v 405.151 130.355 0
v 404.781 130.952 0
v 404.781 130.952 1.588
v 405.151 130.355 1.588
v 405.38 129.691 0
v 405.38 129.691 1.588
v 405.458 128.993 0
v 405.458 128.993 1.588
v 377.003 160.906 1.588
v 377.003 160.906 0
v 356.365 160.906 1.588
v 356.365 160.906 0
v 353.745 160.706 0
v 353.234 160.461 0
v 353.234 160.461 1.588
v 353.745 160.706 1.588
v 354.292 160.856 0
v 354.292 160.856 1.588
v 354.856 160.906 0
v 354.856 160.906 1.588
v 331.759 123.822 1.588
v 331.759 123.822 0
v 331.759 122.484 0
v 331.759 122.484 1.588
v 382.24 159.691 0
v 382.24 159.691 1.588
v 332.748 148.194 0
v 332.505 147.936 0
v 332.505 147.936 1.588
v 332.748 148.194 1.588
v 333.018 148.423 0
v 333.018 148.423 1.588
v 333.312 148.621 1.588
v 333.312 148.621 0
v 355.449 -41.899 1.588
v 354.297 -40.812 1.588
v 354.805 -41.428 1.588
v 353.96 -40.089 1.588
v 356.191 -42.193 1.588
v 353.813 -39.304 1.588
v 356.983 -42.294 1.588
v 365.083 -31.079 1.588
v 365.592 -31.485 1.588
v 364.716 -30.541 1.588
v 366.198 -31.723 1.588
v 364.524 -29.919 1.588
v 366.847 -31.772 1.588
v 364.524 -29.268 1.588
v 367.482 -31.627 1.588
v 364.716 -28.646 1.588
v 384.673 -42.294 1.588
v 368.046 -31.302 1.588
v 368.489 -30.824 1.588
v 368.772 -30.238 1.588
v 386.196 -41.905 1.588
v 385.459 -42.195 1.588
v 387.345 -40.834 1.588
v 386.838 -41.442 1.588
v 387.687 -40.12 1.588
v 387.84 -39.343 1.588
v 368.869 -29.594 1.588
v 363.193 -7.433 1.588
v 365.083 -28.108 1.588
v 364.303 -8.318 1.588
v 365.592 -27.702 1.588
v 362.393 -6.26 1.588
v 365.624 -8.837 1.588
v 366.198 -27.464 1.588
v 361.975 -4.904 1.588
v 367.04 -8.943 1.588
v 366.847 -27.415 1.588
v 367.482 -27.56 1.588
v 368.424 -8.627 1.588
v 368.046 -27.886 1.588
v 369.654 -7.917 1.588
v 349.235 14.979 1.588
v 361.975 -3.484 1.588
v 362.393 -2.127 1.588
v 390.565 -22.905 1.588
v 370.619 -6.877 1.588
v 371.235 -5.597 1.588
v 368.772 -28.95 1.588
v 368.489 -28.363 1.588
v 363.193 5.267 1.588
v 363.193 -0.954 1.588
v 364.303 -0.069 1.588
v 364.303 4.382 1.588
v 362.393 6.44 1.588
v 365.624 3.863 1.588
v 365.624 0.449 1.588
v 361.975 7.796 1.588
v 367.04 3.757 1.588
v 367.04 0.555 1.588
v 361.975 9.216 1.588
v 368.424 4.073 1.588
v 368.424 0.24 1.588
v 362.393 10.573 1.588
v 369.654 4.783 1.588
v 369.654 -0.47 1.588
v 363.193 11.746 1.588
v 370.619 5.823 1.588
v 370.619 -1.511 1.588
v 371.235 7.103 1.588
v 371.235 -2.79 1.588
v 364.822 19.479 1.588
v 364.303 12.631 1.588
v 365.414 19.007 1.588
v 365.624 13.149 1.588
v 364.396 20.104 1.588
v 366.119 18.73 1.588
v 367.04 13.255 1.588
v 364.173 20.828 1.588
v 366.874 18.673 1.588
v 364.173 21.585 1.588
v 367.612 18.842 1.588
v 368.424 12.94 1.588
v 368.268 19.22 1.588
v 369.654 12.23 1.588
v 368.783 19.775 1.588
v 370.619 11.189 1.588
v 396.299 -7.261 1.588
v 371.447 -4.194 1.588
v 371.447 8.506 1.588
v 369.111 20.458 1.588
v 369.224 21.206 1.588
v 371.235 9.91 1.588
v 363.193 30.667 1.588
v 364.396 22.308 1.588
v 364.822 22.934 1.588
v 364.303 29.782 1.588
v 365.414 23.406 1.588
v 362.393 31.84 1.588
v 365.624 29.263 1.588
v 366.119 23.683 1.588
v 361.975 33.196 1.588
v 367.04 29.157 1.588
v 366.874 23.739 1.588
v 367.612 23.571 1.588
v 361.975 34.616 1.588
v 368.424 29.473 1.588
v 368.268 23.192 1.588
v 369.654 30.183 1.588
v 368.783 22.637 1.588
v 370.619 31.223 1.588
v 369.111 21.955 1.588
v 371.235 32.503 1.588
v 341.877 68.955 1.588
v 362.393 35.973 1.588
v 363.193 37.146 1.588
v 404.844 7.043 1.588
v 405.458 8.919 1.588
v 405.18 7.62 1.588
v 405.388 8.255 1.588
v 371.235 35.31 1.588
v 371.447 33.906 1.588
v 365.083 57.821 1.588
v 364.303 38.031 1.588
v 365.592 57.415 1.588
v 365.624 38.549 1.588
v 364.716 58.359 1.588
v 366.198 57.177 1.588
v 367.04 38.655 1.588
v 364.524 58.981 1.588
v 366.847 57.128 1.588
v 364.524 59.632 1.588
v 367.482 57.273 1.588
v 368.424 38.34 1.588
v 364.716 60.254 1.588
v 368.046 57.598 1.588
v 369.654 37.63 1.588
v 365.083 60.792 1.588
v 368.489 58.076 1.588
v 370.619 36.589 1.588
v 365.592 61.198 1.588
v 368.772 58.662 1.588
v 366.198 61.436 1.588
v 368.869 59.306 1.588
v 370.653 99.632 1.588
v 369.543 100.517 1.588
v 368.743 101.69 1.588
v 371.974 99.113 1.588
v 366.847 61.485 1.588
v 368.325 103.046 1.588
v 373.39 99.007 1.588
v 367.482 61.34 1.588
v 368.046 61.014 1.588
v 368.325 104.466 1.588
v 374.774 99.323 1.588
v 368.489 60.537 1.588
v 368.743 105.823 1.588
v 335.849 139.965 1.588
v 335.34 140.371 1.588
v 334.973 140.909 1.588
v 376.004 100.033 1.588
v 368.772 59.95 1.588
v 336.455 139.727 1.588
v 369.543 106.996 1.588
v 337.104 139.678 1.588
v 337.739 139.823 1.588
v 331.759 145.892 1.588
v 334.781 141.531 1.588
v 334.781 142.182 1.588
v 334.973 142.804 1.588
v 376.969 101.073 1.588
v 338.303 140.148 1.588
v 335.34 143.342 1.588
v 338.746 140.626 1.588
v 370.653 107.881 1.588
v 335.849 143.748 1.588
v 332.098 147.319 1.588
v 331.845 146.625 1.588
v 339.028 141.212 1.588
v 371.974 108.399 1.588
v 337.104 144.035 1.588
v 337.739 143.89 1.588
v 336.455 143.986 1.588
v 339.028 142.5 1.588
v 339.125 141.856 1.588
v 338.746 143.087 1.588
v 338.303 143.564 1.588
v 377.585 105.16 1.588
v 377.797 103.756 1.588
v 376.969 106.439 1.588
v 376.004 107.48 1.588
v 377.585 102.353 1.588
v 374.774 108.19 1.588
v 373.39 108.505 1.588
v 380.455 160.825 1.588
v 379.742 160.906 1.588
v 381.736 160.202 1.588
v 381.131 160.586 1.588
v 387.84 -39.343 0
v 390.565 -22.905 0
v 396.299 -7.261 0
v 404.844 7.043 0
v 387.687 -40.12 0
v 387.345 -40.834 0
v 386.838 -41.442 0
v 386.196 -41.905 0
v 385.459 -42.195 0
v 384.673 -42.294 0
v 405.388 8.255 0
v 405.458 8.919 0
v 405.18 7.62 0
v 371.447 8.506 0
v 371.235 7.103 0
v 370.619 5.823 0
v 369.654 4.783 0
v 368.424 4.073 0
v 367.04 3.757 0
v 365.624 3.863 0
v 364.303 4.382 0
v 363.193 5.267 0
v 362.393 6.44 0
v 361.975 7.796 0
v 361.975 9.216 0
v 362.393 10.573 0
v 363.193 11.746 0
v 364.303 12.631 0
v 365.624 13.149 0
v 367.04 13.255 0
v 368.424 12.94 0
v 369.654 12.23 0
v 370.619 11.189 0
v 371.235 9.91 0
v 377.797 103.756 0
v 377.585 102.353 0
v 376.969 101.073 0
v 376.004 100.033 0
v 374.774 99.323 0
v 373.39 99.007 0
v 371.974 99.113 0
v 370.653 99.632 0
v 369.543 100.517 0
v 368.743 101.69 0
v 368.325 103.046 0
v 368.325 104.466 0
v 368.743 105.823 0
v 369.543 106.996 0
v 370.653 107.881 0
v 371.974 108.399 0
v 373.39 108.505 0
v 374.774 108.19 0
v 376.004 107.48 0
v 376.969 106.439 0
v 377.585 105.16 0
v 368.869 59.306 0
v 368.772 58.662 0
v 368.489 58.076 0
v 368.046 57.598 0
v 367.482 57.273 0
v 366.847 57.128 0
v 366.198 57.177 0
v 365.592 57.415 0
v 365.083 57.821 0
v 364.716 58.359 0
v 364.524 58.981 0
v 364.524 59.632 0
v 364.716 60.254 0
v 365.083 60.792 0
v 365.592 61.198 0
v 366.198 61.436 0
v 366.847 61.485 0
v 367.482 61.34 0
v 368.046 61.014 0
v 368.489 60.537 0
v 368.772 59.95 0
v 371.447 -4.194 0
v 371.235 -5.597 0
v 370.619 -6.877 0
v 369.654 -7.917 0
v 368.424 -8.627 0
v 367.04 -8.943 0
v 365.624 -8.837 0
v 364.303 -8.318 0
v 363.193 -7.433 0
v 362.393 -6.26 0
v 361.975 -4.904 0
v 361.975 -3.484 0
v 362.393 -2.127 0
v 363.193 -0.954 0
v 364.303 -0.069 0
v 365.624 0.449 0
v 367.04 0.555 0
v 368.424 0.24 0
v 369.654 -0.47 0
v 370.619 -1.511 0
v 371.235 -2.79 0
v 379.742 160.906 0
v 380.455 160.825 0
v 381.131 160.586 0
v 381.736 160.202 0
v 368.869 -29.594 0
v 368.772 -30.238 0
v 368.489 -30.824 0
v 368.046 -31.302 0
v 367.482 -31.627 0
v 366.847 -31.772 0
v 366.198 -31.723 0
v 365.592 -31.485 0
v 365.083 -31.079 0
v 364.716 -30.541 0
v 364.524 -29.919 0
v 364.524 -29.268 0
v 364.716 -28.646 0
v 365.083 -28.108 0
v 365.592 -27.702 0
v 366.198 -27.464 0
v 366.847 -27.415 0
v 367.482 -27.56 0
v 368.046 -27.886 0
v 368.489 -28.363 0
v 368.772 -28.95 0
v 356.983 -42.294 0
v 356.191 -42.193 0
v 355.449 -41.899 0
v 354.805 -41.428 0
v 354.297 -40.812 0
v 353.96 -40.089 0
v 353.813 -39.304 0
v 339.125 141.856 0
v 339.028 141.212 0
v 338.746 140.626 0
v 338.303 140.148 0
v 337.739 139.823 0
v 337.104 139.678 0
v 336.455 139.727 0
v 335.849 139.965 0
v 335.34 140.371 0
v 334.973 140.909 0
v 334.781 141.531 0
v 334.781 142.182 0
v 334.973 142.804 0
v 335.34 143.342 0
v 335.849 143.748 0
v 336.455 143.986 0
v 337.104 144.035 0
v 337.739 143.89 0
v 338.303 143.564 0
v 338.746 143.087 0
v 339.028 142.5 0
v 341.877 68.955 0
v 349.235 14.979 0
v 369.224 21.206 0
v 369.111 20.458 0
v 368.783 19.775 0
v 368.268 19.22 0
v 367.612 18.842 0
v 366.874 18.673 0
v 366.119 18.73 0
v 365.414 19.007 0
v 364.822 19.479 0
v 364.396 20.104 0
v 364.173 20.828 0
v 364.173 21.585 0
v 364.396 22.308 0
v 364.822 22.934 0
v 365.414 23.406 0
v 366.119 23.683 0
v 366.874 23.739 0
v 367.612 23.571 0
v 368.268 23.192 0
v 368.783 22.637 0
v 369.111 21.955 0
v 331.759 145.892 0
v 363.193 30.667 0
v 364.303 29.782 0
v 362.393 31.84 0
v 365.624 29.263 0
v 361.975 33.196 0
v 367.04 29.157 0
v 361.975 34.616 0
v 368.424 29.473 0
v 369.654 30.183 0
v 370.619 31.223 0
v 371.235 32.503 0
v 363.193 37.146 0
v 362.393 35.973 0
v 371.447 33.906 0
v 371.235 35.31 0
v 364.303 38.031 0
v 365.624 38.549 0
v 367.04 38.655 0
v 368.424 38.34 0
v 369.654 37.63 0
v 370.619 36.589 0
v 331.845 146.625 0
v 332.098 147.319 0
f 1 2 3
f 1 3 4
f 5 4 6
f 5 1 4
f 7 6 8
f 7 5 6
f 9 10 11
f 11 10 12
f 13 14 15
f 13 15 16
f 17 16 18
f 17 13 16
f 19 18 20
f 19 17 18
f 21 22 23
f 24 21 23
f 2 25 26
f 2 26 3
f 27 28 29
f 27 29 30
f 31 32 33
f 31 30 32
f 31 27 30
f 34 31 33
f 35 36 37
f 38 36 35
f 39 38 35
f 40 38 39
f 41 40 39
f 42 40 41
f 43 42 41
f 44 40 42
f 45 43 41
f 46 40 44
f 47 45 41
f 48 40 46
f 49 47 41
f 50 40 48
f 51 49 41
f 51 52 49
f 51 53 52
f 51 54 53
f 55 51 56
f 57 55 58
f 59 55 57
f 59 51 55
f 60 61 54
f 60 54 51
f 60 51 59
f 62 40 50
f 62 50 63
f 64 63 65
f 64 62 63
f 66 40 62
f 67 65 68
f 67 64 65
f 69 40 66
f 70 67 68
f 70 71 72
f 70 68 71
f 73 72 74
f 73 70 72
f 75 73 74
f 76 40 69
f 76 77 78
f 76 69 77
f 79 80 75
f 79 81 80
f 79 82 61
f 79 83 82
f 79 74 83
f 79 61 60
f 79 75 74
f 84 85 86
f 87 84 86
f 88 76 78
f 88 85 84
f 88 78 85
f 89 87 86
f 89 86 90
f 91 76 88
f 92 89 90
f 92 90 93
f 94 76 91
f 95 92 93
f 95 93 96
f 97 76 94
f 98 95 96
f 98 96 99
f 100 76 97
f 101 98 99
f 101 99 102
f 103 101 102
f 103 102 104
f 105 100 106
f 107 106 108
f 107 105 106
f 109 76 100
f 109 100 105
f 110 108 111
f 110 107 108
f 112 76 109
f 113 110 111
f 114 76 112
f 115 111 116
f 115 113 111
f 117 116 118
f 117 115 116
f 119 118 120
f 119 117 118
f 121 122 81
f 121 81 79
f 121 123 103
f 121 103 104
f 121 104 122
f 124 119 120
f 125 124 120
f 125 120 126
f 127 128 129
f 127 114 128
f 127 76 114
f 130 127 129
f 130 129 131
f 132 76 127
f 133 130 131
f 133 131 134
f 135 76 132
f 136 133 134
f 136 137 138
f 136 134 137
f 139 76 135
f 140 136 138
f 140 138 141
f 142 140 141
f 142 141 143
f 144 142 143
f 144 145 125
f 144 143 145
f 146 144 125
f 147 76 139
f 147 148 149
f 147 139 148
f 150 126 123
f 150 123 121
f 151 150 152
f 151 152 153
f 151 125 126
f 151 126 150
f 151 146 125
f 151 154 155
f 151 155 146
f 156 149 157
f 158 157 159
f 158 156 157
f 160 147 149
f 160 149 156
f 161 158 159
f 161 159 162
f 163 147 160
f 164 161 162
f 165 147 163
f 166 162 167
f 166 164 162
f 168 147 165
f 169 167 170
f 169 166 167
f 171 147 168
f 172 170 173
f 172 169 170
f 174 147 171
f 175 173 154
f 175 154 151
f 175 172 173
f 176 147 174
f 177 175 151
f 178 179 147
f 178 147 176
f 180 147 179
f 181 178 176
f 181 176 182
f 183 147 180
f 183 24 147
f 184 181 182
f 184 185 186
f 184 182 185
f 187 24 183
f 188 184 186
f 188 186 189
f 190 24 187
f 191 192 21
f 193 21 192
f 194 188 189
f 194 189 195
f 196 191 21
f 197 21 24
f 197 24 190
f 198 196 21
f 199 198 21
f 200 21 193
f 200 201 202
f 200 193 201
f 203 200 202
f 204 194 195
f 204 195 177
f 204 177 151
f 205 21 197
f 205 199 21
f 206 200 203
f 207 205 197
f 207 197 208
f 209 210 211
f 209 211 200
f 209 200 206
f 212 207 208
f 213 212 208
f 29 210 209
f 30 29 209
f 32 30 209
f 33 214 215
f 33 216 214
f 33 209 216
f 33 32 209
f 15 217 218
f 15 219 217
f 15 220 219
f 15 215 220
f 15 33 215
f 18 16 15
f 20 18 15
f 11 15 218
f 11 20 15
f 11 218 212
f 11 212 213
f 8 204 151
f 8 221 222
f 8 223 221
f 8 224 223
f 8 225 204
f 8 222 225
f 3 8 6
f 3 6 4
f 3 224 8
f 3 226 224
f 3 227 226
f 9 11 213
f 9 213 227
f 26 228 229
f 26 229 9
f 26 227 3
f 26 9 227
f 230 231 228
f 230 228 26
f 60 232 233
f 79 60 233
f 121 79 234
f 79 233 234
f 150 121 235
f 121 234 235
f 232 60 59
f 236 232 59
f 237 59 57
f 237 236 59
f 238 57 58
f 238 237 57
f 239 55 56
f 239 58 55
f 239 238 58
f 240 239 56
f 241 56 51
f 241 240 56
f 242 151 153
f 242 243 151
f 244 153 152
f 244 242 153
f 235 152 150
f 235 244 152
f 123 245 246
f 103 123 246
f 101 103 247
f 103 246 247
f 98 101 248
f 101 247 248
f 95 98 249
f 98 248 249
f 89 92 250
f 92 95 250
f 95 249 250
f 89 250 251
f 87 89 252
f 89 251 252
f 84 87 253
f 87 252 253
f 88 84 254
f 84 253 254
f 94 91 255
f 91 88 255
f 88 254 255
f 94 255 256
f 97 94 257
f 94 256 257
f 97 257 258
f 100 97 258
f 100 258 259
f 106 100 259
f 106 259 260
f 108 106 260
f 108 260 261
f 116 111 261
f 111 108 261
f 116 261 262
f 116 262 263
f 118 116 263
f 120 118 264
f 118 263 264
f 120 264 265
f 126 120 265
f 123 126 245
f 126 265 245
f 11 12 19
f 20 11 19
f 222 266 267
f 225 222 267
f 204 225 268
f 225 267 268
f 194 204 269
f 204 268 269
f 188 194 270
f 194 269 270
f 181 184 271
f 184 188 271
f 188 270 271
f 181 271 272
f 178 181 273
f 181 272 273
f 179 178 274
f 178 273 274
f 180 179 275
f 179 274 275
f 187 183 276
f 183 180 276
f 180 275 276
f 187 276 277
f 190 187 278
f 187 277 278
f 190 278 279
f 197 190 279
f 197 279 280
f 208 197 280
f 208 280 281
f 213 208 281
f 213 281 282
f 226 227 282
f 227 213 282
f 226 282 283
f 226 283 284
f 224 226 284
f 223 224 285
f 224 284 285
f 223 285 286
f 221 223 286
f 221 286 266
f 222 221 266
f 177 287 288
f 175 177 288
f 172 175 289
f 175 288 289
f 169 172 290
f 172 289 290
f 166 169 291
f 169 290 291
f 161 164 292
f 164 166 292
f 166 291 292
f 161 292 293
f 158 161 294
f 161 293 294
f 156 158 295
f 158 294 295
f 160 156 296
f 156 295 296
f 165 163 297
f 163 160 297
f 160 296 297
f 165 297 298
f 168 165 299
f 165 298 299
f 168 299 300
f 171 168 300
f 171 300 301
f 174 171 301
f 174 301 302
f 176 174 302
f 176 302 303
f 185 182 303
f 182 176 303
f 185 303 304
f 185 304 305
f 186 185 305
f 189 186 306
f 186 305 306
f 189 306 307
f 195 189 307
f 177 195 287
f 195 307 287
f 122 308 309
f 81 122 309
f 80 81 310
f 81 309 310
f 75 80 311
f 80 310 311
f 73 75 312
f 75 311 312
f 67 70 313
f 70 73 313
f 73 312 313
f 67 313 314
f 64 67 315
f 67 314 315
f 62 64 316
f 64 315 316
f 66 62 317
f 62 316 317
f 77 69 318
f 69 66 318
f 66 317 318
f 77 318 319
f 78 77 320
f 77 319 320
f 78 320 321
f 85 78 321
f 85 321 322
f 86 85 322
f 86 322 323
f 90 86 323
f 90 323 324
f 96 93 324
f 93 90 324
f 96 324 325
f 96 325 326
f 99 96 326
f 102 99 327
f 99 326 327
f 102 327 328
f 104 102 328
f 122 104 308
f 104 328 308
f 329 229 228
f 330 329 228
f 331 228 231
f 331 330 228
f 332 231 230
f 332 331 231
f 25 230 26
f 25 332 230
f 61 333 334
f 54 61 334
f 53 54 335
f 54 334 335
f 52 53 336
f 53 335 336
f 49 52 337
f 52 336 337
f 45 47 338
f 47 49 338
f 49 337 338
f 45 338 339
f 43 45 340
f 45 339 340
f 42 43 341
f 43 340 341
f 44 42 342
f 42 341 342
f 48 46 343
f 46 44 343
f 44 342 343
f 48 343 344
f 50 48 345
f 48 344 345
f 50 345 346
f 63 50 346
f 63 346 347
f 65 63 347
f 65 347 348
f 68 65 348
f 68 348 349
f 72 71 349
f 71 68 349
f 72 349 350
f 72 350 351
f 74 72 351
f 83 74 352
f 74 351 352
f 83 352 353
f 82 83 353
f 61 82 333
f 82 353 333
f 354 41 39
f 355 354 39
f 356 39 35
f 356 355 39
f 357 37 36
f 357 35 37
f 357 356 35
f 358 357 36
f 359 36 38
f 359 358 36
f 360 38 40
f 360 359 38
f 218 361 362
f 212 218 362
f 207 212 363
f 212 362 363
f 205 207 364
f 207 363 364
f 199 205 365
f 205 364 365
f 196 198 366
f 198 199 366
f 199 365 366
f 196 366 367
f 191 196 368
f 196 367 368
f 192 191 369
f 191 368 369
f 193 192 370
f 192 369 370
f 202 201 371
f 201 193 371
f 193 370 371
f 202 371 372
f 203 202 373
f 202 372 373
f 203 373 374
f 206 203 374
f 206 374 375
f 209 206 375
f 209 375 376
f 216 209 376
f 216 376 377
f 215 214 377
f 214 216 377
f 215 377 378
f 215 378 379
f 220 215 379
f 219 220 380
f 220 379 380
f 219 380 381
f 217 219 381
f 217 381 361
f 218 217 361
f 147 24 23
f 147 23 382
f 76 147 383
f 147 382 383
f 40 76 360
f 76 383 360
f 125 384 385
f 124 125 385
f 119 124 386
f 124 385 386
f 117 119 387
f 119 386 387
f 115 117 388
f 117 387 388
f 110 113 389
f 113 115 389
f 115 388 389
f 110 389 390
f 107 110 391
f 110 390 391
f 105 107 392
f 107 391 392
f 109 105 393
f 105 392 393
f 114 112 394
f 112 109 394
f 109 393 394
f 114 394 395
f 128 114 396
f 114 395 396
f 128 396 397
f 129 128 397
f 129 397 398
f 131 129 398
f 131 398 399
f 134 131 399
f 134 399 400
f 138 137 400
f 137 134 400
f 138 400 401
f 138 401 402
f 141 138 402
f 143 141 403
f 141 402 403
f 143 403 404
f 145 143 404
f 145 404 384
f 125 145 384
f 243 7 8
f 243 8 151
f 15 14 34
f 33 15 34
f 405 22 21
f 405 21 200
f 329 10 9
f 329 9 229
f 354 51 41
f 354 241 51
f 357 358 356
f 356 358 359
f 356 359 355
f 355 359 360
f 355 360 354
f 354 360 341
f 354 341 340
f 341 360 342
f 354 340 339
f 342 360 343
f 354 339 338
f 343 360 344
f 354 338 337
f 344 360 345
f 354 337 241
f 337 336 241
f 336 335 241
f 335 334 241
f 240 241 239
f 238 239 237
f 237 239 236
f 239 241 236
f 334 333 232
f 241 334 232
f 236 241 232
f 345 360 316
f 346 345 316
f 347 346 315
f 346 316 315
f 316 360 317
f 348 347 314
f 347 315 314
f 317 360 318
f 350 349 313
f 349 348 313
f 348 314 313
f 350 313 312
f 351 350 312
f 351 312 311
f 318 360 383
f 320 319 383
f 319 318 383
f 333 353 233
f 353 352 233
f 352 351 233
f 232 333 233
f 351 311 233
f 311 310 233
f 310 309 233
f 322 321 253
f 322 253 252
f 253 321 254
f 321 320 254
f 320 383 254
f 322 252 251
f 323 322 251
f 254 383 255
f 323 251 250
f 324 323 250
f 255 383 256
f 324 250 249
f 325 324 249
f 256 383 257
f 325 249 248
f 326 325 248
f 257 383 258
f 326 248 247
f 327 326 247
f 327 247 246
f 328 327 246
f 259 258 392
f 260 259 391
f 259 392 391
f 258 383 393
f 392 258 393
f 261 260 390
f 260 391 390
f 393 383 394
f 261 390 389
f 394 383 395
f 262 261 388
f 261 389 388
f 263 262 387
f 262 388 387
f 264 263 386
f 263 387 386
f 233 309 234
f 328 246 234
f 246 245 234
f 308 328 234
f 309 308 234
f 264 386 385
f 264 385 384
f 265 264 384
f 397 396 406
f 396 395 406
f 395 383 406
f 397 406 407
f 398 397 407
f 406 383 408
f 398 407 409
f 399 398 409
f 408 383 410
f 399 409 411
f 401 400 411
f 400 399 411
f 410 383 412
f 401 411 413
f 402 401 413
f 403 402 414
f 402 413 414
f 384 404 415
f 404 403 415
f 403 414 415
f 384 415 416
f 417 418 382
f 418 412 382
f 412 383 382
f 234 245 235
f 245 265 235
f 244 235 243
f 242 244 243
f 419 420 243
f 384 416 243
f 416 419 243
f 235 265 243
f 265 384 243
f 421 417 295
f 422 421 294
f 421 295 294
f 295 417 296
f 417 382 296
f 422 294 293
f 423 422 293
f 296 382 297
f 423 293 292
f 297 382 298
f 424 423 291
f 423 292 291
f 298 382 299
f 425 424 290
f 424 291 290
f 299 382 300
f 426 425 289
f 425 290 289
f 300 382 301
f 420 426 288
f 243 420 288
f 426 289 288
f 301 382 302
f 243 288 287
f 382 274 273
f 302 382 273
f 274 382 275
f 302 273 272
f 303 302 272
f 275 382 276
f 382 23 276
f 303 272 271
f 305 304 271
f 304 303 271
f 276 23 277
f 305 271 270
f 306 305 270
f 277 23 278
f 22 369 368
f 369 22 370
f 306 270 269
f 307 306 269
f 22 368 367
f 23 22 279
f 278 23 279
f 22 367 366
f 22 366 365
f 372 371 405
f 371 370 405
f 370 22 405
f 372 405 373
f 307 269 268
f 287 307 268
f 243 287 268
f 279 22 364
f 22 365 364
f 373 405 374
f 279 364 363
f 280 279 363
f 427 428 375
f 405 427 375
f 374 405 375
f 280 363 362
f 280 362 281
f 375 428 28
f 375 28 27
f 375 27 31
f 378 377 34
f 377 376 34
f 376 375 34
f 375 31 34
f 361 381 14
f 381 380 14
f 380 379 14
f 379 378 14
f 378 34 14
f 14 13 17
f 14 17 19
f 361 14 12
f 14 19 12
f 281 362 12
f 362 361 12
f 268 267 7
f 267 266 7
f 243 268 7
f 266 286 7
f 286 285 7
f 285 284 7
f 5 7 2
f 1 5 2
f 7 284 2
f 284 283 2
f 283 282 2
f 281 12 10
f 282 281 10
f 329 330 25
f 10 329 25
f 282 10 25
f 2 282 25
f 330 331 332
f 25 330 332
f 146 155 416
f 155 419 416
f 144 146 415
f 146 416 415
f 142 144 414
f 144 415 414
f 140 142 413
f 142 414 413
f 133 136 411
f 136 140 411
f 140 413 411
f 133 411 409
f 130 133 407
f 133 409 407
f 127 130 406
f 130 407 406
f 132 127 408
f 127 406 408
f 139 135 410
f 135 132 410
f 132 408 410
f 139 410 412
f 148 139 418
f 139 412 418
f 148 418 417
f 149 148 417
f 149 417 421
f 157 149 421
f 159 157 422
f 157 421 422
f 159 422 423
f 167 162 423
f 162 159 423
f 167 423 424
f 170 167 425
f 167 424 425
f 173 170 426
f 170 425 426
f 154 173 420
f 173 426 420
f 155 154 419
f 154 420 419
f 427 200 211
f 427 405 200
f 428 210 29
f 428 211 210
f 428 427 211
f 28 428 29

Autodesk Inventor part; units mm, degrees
ref_plane "YZ Plane" through (0, 0, 0) normal (1, 0, 0) x (0, 1, 0)
ref_plane "XZ Plane" through (0, 0, 0) normal (0, 1, 0) x (-1, 0, 0)
ref_plane "XY Plane" through (0, 0, 0) normal (0, 0, 1) x (1, 0, 0)
sketch "Sketch1" plane through (0, 0, 0) normal (0, 0, 1) x (1, 0, 0)
  line L0 (377.0029, 160.9063) -> (356.3654, 160.9063)
  circle A0 centre (336.9408, 141.8563) radius 2.1844
  line L1 (331.7592, 123.8223) -> (331.7592, 147.1903)
  line L2 (331.7592, 147.1903) -> (332.7752, 148.2063)
  line L3 (332.7752, 148.2063) -> (342.0779, 148.2063)
  line L4 (356.3654, 160.9063) -> (353.9842, 160.9063)
  line L5 (354.8564, 160.9063) -> (379.7418, 160.9063)
  line L6 (382.24, 159.6907) -> (404.7811, 130.9525)
  line L7 (405.4579, 128.993) -> (405.4579, 8.9191)
  line L8 (353.2344, 160.4607) -> (333.3122, 148.6212)
  line L9 (331.7592, 145.8918) -> (331.7592, 122.4835)
  arc A1 (404.8445, 7.0432) -> (387.8405, -39.3429) centre (476.7839, -45.6377) ccw
  line L10 (384.6734, -42.2937) -> (356.983, -42.2937)
  arc A2 (353.8134, -39.3043) -> (331.7592, 122.4835) centre (-705.6943, -101.3347) ccw
  arc A3 (333.3122, 148.6212) -> (331.7592, 145.8918) centre (334.9342, 145.8918) ccw
  arc A4 (354.8564, 160.9063) -> (353.2344, 160.4607) centre (354.8564, 157.7313) ccw
  arc A5 (382.24, 159.6907) -> (379.7418, 160.9063) centre (379.7418, 157.7313) ccw
  arc A6 (405.4579, 128.993) -> (404.7811, 130.9525) centre (402.2829, 128.993) ccw
  arc A7 (404.8445, 7.0432) -> (405.4579, 8.9191) centre (402.2829, 8.9191) ccw
  arc A8 (384.6734, -42.2937) -> (387.8405, -39.3429) centre (384.6734, -39.1187) ccw
  arc A9 (353.8134, -39.3043) -> (356.983, -42.2937) centre (356.983, -39.1187) ccw
  circle A10 centre (373.0342, 103.7563) radius 4.7625
  circle A11 centre (366.6842, 59.3063) radius 2.1844
  circle A12 centre (366.6842, 21.2063) radius 2.54
  circle A13 centre (366.6842, 33.9063) radius 4.7625
  circle A14 centre (366.6842, 8.5063) radius 4.7625
  circle A15 centre (366.6842, -4.1937) radius 4.7625
  circle A16 centre (366.6842, -29.5937) radius 2.1844
  point P0 (0, 0)
  point P1 (405.4579, 7.8708)
  point P2 (387.6807, -42.2937)
  point P3 (353.9842, -42.2937)
  dimension "d1" = 3.175
  dimension "d2" = 3.175
  dimension "d3" = 9.525
  dimension "d4" = 4.3688
  dimension "d5" = 5.08
  dimension "d6" = 9.525
  dimension "d7" = 9.525
  dimension "d8" = 9.525
  dimension "d9" = 4.3688
extrude "Extrusion1" add sketch "Sketch1" along normal blind 1.5875 contours L5 A5 L6 A6 L7 A7 A1 A8 L10 A9 A2 L9 L1 A3 L8 A4 L4 L0
